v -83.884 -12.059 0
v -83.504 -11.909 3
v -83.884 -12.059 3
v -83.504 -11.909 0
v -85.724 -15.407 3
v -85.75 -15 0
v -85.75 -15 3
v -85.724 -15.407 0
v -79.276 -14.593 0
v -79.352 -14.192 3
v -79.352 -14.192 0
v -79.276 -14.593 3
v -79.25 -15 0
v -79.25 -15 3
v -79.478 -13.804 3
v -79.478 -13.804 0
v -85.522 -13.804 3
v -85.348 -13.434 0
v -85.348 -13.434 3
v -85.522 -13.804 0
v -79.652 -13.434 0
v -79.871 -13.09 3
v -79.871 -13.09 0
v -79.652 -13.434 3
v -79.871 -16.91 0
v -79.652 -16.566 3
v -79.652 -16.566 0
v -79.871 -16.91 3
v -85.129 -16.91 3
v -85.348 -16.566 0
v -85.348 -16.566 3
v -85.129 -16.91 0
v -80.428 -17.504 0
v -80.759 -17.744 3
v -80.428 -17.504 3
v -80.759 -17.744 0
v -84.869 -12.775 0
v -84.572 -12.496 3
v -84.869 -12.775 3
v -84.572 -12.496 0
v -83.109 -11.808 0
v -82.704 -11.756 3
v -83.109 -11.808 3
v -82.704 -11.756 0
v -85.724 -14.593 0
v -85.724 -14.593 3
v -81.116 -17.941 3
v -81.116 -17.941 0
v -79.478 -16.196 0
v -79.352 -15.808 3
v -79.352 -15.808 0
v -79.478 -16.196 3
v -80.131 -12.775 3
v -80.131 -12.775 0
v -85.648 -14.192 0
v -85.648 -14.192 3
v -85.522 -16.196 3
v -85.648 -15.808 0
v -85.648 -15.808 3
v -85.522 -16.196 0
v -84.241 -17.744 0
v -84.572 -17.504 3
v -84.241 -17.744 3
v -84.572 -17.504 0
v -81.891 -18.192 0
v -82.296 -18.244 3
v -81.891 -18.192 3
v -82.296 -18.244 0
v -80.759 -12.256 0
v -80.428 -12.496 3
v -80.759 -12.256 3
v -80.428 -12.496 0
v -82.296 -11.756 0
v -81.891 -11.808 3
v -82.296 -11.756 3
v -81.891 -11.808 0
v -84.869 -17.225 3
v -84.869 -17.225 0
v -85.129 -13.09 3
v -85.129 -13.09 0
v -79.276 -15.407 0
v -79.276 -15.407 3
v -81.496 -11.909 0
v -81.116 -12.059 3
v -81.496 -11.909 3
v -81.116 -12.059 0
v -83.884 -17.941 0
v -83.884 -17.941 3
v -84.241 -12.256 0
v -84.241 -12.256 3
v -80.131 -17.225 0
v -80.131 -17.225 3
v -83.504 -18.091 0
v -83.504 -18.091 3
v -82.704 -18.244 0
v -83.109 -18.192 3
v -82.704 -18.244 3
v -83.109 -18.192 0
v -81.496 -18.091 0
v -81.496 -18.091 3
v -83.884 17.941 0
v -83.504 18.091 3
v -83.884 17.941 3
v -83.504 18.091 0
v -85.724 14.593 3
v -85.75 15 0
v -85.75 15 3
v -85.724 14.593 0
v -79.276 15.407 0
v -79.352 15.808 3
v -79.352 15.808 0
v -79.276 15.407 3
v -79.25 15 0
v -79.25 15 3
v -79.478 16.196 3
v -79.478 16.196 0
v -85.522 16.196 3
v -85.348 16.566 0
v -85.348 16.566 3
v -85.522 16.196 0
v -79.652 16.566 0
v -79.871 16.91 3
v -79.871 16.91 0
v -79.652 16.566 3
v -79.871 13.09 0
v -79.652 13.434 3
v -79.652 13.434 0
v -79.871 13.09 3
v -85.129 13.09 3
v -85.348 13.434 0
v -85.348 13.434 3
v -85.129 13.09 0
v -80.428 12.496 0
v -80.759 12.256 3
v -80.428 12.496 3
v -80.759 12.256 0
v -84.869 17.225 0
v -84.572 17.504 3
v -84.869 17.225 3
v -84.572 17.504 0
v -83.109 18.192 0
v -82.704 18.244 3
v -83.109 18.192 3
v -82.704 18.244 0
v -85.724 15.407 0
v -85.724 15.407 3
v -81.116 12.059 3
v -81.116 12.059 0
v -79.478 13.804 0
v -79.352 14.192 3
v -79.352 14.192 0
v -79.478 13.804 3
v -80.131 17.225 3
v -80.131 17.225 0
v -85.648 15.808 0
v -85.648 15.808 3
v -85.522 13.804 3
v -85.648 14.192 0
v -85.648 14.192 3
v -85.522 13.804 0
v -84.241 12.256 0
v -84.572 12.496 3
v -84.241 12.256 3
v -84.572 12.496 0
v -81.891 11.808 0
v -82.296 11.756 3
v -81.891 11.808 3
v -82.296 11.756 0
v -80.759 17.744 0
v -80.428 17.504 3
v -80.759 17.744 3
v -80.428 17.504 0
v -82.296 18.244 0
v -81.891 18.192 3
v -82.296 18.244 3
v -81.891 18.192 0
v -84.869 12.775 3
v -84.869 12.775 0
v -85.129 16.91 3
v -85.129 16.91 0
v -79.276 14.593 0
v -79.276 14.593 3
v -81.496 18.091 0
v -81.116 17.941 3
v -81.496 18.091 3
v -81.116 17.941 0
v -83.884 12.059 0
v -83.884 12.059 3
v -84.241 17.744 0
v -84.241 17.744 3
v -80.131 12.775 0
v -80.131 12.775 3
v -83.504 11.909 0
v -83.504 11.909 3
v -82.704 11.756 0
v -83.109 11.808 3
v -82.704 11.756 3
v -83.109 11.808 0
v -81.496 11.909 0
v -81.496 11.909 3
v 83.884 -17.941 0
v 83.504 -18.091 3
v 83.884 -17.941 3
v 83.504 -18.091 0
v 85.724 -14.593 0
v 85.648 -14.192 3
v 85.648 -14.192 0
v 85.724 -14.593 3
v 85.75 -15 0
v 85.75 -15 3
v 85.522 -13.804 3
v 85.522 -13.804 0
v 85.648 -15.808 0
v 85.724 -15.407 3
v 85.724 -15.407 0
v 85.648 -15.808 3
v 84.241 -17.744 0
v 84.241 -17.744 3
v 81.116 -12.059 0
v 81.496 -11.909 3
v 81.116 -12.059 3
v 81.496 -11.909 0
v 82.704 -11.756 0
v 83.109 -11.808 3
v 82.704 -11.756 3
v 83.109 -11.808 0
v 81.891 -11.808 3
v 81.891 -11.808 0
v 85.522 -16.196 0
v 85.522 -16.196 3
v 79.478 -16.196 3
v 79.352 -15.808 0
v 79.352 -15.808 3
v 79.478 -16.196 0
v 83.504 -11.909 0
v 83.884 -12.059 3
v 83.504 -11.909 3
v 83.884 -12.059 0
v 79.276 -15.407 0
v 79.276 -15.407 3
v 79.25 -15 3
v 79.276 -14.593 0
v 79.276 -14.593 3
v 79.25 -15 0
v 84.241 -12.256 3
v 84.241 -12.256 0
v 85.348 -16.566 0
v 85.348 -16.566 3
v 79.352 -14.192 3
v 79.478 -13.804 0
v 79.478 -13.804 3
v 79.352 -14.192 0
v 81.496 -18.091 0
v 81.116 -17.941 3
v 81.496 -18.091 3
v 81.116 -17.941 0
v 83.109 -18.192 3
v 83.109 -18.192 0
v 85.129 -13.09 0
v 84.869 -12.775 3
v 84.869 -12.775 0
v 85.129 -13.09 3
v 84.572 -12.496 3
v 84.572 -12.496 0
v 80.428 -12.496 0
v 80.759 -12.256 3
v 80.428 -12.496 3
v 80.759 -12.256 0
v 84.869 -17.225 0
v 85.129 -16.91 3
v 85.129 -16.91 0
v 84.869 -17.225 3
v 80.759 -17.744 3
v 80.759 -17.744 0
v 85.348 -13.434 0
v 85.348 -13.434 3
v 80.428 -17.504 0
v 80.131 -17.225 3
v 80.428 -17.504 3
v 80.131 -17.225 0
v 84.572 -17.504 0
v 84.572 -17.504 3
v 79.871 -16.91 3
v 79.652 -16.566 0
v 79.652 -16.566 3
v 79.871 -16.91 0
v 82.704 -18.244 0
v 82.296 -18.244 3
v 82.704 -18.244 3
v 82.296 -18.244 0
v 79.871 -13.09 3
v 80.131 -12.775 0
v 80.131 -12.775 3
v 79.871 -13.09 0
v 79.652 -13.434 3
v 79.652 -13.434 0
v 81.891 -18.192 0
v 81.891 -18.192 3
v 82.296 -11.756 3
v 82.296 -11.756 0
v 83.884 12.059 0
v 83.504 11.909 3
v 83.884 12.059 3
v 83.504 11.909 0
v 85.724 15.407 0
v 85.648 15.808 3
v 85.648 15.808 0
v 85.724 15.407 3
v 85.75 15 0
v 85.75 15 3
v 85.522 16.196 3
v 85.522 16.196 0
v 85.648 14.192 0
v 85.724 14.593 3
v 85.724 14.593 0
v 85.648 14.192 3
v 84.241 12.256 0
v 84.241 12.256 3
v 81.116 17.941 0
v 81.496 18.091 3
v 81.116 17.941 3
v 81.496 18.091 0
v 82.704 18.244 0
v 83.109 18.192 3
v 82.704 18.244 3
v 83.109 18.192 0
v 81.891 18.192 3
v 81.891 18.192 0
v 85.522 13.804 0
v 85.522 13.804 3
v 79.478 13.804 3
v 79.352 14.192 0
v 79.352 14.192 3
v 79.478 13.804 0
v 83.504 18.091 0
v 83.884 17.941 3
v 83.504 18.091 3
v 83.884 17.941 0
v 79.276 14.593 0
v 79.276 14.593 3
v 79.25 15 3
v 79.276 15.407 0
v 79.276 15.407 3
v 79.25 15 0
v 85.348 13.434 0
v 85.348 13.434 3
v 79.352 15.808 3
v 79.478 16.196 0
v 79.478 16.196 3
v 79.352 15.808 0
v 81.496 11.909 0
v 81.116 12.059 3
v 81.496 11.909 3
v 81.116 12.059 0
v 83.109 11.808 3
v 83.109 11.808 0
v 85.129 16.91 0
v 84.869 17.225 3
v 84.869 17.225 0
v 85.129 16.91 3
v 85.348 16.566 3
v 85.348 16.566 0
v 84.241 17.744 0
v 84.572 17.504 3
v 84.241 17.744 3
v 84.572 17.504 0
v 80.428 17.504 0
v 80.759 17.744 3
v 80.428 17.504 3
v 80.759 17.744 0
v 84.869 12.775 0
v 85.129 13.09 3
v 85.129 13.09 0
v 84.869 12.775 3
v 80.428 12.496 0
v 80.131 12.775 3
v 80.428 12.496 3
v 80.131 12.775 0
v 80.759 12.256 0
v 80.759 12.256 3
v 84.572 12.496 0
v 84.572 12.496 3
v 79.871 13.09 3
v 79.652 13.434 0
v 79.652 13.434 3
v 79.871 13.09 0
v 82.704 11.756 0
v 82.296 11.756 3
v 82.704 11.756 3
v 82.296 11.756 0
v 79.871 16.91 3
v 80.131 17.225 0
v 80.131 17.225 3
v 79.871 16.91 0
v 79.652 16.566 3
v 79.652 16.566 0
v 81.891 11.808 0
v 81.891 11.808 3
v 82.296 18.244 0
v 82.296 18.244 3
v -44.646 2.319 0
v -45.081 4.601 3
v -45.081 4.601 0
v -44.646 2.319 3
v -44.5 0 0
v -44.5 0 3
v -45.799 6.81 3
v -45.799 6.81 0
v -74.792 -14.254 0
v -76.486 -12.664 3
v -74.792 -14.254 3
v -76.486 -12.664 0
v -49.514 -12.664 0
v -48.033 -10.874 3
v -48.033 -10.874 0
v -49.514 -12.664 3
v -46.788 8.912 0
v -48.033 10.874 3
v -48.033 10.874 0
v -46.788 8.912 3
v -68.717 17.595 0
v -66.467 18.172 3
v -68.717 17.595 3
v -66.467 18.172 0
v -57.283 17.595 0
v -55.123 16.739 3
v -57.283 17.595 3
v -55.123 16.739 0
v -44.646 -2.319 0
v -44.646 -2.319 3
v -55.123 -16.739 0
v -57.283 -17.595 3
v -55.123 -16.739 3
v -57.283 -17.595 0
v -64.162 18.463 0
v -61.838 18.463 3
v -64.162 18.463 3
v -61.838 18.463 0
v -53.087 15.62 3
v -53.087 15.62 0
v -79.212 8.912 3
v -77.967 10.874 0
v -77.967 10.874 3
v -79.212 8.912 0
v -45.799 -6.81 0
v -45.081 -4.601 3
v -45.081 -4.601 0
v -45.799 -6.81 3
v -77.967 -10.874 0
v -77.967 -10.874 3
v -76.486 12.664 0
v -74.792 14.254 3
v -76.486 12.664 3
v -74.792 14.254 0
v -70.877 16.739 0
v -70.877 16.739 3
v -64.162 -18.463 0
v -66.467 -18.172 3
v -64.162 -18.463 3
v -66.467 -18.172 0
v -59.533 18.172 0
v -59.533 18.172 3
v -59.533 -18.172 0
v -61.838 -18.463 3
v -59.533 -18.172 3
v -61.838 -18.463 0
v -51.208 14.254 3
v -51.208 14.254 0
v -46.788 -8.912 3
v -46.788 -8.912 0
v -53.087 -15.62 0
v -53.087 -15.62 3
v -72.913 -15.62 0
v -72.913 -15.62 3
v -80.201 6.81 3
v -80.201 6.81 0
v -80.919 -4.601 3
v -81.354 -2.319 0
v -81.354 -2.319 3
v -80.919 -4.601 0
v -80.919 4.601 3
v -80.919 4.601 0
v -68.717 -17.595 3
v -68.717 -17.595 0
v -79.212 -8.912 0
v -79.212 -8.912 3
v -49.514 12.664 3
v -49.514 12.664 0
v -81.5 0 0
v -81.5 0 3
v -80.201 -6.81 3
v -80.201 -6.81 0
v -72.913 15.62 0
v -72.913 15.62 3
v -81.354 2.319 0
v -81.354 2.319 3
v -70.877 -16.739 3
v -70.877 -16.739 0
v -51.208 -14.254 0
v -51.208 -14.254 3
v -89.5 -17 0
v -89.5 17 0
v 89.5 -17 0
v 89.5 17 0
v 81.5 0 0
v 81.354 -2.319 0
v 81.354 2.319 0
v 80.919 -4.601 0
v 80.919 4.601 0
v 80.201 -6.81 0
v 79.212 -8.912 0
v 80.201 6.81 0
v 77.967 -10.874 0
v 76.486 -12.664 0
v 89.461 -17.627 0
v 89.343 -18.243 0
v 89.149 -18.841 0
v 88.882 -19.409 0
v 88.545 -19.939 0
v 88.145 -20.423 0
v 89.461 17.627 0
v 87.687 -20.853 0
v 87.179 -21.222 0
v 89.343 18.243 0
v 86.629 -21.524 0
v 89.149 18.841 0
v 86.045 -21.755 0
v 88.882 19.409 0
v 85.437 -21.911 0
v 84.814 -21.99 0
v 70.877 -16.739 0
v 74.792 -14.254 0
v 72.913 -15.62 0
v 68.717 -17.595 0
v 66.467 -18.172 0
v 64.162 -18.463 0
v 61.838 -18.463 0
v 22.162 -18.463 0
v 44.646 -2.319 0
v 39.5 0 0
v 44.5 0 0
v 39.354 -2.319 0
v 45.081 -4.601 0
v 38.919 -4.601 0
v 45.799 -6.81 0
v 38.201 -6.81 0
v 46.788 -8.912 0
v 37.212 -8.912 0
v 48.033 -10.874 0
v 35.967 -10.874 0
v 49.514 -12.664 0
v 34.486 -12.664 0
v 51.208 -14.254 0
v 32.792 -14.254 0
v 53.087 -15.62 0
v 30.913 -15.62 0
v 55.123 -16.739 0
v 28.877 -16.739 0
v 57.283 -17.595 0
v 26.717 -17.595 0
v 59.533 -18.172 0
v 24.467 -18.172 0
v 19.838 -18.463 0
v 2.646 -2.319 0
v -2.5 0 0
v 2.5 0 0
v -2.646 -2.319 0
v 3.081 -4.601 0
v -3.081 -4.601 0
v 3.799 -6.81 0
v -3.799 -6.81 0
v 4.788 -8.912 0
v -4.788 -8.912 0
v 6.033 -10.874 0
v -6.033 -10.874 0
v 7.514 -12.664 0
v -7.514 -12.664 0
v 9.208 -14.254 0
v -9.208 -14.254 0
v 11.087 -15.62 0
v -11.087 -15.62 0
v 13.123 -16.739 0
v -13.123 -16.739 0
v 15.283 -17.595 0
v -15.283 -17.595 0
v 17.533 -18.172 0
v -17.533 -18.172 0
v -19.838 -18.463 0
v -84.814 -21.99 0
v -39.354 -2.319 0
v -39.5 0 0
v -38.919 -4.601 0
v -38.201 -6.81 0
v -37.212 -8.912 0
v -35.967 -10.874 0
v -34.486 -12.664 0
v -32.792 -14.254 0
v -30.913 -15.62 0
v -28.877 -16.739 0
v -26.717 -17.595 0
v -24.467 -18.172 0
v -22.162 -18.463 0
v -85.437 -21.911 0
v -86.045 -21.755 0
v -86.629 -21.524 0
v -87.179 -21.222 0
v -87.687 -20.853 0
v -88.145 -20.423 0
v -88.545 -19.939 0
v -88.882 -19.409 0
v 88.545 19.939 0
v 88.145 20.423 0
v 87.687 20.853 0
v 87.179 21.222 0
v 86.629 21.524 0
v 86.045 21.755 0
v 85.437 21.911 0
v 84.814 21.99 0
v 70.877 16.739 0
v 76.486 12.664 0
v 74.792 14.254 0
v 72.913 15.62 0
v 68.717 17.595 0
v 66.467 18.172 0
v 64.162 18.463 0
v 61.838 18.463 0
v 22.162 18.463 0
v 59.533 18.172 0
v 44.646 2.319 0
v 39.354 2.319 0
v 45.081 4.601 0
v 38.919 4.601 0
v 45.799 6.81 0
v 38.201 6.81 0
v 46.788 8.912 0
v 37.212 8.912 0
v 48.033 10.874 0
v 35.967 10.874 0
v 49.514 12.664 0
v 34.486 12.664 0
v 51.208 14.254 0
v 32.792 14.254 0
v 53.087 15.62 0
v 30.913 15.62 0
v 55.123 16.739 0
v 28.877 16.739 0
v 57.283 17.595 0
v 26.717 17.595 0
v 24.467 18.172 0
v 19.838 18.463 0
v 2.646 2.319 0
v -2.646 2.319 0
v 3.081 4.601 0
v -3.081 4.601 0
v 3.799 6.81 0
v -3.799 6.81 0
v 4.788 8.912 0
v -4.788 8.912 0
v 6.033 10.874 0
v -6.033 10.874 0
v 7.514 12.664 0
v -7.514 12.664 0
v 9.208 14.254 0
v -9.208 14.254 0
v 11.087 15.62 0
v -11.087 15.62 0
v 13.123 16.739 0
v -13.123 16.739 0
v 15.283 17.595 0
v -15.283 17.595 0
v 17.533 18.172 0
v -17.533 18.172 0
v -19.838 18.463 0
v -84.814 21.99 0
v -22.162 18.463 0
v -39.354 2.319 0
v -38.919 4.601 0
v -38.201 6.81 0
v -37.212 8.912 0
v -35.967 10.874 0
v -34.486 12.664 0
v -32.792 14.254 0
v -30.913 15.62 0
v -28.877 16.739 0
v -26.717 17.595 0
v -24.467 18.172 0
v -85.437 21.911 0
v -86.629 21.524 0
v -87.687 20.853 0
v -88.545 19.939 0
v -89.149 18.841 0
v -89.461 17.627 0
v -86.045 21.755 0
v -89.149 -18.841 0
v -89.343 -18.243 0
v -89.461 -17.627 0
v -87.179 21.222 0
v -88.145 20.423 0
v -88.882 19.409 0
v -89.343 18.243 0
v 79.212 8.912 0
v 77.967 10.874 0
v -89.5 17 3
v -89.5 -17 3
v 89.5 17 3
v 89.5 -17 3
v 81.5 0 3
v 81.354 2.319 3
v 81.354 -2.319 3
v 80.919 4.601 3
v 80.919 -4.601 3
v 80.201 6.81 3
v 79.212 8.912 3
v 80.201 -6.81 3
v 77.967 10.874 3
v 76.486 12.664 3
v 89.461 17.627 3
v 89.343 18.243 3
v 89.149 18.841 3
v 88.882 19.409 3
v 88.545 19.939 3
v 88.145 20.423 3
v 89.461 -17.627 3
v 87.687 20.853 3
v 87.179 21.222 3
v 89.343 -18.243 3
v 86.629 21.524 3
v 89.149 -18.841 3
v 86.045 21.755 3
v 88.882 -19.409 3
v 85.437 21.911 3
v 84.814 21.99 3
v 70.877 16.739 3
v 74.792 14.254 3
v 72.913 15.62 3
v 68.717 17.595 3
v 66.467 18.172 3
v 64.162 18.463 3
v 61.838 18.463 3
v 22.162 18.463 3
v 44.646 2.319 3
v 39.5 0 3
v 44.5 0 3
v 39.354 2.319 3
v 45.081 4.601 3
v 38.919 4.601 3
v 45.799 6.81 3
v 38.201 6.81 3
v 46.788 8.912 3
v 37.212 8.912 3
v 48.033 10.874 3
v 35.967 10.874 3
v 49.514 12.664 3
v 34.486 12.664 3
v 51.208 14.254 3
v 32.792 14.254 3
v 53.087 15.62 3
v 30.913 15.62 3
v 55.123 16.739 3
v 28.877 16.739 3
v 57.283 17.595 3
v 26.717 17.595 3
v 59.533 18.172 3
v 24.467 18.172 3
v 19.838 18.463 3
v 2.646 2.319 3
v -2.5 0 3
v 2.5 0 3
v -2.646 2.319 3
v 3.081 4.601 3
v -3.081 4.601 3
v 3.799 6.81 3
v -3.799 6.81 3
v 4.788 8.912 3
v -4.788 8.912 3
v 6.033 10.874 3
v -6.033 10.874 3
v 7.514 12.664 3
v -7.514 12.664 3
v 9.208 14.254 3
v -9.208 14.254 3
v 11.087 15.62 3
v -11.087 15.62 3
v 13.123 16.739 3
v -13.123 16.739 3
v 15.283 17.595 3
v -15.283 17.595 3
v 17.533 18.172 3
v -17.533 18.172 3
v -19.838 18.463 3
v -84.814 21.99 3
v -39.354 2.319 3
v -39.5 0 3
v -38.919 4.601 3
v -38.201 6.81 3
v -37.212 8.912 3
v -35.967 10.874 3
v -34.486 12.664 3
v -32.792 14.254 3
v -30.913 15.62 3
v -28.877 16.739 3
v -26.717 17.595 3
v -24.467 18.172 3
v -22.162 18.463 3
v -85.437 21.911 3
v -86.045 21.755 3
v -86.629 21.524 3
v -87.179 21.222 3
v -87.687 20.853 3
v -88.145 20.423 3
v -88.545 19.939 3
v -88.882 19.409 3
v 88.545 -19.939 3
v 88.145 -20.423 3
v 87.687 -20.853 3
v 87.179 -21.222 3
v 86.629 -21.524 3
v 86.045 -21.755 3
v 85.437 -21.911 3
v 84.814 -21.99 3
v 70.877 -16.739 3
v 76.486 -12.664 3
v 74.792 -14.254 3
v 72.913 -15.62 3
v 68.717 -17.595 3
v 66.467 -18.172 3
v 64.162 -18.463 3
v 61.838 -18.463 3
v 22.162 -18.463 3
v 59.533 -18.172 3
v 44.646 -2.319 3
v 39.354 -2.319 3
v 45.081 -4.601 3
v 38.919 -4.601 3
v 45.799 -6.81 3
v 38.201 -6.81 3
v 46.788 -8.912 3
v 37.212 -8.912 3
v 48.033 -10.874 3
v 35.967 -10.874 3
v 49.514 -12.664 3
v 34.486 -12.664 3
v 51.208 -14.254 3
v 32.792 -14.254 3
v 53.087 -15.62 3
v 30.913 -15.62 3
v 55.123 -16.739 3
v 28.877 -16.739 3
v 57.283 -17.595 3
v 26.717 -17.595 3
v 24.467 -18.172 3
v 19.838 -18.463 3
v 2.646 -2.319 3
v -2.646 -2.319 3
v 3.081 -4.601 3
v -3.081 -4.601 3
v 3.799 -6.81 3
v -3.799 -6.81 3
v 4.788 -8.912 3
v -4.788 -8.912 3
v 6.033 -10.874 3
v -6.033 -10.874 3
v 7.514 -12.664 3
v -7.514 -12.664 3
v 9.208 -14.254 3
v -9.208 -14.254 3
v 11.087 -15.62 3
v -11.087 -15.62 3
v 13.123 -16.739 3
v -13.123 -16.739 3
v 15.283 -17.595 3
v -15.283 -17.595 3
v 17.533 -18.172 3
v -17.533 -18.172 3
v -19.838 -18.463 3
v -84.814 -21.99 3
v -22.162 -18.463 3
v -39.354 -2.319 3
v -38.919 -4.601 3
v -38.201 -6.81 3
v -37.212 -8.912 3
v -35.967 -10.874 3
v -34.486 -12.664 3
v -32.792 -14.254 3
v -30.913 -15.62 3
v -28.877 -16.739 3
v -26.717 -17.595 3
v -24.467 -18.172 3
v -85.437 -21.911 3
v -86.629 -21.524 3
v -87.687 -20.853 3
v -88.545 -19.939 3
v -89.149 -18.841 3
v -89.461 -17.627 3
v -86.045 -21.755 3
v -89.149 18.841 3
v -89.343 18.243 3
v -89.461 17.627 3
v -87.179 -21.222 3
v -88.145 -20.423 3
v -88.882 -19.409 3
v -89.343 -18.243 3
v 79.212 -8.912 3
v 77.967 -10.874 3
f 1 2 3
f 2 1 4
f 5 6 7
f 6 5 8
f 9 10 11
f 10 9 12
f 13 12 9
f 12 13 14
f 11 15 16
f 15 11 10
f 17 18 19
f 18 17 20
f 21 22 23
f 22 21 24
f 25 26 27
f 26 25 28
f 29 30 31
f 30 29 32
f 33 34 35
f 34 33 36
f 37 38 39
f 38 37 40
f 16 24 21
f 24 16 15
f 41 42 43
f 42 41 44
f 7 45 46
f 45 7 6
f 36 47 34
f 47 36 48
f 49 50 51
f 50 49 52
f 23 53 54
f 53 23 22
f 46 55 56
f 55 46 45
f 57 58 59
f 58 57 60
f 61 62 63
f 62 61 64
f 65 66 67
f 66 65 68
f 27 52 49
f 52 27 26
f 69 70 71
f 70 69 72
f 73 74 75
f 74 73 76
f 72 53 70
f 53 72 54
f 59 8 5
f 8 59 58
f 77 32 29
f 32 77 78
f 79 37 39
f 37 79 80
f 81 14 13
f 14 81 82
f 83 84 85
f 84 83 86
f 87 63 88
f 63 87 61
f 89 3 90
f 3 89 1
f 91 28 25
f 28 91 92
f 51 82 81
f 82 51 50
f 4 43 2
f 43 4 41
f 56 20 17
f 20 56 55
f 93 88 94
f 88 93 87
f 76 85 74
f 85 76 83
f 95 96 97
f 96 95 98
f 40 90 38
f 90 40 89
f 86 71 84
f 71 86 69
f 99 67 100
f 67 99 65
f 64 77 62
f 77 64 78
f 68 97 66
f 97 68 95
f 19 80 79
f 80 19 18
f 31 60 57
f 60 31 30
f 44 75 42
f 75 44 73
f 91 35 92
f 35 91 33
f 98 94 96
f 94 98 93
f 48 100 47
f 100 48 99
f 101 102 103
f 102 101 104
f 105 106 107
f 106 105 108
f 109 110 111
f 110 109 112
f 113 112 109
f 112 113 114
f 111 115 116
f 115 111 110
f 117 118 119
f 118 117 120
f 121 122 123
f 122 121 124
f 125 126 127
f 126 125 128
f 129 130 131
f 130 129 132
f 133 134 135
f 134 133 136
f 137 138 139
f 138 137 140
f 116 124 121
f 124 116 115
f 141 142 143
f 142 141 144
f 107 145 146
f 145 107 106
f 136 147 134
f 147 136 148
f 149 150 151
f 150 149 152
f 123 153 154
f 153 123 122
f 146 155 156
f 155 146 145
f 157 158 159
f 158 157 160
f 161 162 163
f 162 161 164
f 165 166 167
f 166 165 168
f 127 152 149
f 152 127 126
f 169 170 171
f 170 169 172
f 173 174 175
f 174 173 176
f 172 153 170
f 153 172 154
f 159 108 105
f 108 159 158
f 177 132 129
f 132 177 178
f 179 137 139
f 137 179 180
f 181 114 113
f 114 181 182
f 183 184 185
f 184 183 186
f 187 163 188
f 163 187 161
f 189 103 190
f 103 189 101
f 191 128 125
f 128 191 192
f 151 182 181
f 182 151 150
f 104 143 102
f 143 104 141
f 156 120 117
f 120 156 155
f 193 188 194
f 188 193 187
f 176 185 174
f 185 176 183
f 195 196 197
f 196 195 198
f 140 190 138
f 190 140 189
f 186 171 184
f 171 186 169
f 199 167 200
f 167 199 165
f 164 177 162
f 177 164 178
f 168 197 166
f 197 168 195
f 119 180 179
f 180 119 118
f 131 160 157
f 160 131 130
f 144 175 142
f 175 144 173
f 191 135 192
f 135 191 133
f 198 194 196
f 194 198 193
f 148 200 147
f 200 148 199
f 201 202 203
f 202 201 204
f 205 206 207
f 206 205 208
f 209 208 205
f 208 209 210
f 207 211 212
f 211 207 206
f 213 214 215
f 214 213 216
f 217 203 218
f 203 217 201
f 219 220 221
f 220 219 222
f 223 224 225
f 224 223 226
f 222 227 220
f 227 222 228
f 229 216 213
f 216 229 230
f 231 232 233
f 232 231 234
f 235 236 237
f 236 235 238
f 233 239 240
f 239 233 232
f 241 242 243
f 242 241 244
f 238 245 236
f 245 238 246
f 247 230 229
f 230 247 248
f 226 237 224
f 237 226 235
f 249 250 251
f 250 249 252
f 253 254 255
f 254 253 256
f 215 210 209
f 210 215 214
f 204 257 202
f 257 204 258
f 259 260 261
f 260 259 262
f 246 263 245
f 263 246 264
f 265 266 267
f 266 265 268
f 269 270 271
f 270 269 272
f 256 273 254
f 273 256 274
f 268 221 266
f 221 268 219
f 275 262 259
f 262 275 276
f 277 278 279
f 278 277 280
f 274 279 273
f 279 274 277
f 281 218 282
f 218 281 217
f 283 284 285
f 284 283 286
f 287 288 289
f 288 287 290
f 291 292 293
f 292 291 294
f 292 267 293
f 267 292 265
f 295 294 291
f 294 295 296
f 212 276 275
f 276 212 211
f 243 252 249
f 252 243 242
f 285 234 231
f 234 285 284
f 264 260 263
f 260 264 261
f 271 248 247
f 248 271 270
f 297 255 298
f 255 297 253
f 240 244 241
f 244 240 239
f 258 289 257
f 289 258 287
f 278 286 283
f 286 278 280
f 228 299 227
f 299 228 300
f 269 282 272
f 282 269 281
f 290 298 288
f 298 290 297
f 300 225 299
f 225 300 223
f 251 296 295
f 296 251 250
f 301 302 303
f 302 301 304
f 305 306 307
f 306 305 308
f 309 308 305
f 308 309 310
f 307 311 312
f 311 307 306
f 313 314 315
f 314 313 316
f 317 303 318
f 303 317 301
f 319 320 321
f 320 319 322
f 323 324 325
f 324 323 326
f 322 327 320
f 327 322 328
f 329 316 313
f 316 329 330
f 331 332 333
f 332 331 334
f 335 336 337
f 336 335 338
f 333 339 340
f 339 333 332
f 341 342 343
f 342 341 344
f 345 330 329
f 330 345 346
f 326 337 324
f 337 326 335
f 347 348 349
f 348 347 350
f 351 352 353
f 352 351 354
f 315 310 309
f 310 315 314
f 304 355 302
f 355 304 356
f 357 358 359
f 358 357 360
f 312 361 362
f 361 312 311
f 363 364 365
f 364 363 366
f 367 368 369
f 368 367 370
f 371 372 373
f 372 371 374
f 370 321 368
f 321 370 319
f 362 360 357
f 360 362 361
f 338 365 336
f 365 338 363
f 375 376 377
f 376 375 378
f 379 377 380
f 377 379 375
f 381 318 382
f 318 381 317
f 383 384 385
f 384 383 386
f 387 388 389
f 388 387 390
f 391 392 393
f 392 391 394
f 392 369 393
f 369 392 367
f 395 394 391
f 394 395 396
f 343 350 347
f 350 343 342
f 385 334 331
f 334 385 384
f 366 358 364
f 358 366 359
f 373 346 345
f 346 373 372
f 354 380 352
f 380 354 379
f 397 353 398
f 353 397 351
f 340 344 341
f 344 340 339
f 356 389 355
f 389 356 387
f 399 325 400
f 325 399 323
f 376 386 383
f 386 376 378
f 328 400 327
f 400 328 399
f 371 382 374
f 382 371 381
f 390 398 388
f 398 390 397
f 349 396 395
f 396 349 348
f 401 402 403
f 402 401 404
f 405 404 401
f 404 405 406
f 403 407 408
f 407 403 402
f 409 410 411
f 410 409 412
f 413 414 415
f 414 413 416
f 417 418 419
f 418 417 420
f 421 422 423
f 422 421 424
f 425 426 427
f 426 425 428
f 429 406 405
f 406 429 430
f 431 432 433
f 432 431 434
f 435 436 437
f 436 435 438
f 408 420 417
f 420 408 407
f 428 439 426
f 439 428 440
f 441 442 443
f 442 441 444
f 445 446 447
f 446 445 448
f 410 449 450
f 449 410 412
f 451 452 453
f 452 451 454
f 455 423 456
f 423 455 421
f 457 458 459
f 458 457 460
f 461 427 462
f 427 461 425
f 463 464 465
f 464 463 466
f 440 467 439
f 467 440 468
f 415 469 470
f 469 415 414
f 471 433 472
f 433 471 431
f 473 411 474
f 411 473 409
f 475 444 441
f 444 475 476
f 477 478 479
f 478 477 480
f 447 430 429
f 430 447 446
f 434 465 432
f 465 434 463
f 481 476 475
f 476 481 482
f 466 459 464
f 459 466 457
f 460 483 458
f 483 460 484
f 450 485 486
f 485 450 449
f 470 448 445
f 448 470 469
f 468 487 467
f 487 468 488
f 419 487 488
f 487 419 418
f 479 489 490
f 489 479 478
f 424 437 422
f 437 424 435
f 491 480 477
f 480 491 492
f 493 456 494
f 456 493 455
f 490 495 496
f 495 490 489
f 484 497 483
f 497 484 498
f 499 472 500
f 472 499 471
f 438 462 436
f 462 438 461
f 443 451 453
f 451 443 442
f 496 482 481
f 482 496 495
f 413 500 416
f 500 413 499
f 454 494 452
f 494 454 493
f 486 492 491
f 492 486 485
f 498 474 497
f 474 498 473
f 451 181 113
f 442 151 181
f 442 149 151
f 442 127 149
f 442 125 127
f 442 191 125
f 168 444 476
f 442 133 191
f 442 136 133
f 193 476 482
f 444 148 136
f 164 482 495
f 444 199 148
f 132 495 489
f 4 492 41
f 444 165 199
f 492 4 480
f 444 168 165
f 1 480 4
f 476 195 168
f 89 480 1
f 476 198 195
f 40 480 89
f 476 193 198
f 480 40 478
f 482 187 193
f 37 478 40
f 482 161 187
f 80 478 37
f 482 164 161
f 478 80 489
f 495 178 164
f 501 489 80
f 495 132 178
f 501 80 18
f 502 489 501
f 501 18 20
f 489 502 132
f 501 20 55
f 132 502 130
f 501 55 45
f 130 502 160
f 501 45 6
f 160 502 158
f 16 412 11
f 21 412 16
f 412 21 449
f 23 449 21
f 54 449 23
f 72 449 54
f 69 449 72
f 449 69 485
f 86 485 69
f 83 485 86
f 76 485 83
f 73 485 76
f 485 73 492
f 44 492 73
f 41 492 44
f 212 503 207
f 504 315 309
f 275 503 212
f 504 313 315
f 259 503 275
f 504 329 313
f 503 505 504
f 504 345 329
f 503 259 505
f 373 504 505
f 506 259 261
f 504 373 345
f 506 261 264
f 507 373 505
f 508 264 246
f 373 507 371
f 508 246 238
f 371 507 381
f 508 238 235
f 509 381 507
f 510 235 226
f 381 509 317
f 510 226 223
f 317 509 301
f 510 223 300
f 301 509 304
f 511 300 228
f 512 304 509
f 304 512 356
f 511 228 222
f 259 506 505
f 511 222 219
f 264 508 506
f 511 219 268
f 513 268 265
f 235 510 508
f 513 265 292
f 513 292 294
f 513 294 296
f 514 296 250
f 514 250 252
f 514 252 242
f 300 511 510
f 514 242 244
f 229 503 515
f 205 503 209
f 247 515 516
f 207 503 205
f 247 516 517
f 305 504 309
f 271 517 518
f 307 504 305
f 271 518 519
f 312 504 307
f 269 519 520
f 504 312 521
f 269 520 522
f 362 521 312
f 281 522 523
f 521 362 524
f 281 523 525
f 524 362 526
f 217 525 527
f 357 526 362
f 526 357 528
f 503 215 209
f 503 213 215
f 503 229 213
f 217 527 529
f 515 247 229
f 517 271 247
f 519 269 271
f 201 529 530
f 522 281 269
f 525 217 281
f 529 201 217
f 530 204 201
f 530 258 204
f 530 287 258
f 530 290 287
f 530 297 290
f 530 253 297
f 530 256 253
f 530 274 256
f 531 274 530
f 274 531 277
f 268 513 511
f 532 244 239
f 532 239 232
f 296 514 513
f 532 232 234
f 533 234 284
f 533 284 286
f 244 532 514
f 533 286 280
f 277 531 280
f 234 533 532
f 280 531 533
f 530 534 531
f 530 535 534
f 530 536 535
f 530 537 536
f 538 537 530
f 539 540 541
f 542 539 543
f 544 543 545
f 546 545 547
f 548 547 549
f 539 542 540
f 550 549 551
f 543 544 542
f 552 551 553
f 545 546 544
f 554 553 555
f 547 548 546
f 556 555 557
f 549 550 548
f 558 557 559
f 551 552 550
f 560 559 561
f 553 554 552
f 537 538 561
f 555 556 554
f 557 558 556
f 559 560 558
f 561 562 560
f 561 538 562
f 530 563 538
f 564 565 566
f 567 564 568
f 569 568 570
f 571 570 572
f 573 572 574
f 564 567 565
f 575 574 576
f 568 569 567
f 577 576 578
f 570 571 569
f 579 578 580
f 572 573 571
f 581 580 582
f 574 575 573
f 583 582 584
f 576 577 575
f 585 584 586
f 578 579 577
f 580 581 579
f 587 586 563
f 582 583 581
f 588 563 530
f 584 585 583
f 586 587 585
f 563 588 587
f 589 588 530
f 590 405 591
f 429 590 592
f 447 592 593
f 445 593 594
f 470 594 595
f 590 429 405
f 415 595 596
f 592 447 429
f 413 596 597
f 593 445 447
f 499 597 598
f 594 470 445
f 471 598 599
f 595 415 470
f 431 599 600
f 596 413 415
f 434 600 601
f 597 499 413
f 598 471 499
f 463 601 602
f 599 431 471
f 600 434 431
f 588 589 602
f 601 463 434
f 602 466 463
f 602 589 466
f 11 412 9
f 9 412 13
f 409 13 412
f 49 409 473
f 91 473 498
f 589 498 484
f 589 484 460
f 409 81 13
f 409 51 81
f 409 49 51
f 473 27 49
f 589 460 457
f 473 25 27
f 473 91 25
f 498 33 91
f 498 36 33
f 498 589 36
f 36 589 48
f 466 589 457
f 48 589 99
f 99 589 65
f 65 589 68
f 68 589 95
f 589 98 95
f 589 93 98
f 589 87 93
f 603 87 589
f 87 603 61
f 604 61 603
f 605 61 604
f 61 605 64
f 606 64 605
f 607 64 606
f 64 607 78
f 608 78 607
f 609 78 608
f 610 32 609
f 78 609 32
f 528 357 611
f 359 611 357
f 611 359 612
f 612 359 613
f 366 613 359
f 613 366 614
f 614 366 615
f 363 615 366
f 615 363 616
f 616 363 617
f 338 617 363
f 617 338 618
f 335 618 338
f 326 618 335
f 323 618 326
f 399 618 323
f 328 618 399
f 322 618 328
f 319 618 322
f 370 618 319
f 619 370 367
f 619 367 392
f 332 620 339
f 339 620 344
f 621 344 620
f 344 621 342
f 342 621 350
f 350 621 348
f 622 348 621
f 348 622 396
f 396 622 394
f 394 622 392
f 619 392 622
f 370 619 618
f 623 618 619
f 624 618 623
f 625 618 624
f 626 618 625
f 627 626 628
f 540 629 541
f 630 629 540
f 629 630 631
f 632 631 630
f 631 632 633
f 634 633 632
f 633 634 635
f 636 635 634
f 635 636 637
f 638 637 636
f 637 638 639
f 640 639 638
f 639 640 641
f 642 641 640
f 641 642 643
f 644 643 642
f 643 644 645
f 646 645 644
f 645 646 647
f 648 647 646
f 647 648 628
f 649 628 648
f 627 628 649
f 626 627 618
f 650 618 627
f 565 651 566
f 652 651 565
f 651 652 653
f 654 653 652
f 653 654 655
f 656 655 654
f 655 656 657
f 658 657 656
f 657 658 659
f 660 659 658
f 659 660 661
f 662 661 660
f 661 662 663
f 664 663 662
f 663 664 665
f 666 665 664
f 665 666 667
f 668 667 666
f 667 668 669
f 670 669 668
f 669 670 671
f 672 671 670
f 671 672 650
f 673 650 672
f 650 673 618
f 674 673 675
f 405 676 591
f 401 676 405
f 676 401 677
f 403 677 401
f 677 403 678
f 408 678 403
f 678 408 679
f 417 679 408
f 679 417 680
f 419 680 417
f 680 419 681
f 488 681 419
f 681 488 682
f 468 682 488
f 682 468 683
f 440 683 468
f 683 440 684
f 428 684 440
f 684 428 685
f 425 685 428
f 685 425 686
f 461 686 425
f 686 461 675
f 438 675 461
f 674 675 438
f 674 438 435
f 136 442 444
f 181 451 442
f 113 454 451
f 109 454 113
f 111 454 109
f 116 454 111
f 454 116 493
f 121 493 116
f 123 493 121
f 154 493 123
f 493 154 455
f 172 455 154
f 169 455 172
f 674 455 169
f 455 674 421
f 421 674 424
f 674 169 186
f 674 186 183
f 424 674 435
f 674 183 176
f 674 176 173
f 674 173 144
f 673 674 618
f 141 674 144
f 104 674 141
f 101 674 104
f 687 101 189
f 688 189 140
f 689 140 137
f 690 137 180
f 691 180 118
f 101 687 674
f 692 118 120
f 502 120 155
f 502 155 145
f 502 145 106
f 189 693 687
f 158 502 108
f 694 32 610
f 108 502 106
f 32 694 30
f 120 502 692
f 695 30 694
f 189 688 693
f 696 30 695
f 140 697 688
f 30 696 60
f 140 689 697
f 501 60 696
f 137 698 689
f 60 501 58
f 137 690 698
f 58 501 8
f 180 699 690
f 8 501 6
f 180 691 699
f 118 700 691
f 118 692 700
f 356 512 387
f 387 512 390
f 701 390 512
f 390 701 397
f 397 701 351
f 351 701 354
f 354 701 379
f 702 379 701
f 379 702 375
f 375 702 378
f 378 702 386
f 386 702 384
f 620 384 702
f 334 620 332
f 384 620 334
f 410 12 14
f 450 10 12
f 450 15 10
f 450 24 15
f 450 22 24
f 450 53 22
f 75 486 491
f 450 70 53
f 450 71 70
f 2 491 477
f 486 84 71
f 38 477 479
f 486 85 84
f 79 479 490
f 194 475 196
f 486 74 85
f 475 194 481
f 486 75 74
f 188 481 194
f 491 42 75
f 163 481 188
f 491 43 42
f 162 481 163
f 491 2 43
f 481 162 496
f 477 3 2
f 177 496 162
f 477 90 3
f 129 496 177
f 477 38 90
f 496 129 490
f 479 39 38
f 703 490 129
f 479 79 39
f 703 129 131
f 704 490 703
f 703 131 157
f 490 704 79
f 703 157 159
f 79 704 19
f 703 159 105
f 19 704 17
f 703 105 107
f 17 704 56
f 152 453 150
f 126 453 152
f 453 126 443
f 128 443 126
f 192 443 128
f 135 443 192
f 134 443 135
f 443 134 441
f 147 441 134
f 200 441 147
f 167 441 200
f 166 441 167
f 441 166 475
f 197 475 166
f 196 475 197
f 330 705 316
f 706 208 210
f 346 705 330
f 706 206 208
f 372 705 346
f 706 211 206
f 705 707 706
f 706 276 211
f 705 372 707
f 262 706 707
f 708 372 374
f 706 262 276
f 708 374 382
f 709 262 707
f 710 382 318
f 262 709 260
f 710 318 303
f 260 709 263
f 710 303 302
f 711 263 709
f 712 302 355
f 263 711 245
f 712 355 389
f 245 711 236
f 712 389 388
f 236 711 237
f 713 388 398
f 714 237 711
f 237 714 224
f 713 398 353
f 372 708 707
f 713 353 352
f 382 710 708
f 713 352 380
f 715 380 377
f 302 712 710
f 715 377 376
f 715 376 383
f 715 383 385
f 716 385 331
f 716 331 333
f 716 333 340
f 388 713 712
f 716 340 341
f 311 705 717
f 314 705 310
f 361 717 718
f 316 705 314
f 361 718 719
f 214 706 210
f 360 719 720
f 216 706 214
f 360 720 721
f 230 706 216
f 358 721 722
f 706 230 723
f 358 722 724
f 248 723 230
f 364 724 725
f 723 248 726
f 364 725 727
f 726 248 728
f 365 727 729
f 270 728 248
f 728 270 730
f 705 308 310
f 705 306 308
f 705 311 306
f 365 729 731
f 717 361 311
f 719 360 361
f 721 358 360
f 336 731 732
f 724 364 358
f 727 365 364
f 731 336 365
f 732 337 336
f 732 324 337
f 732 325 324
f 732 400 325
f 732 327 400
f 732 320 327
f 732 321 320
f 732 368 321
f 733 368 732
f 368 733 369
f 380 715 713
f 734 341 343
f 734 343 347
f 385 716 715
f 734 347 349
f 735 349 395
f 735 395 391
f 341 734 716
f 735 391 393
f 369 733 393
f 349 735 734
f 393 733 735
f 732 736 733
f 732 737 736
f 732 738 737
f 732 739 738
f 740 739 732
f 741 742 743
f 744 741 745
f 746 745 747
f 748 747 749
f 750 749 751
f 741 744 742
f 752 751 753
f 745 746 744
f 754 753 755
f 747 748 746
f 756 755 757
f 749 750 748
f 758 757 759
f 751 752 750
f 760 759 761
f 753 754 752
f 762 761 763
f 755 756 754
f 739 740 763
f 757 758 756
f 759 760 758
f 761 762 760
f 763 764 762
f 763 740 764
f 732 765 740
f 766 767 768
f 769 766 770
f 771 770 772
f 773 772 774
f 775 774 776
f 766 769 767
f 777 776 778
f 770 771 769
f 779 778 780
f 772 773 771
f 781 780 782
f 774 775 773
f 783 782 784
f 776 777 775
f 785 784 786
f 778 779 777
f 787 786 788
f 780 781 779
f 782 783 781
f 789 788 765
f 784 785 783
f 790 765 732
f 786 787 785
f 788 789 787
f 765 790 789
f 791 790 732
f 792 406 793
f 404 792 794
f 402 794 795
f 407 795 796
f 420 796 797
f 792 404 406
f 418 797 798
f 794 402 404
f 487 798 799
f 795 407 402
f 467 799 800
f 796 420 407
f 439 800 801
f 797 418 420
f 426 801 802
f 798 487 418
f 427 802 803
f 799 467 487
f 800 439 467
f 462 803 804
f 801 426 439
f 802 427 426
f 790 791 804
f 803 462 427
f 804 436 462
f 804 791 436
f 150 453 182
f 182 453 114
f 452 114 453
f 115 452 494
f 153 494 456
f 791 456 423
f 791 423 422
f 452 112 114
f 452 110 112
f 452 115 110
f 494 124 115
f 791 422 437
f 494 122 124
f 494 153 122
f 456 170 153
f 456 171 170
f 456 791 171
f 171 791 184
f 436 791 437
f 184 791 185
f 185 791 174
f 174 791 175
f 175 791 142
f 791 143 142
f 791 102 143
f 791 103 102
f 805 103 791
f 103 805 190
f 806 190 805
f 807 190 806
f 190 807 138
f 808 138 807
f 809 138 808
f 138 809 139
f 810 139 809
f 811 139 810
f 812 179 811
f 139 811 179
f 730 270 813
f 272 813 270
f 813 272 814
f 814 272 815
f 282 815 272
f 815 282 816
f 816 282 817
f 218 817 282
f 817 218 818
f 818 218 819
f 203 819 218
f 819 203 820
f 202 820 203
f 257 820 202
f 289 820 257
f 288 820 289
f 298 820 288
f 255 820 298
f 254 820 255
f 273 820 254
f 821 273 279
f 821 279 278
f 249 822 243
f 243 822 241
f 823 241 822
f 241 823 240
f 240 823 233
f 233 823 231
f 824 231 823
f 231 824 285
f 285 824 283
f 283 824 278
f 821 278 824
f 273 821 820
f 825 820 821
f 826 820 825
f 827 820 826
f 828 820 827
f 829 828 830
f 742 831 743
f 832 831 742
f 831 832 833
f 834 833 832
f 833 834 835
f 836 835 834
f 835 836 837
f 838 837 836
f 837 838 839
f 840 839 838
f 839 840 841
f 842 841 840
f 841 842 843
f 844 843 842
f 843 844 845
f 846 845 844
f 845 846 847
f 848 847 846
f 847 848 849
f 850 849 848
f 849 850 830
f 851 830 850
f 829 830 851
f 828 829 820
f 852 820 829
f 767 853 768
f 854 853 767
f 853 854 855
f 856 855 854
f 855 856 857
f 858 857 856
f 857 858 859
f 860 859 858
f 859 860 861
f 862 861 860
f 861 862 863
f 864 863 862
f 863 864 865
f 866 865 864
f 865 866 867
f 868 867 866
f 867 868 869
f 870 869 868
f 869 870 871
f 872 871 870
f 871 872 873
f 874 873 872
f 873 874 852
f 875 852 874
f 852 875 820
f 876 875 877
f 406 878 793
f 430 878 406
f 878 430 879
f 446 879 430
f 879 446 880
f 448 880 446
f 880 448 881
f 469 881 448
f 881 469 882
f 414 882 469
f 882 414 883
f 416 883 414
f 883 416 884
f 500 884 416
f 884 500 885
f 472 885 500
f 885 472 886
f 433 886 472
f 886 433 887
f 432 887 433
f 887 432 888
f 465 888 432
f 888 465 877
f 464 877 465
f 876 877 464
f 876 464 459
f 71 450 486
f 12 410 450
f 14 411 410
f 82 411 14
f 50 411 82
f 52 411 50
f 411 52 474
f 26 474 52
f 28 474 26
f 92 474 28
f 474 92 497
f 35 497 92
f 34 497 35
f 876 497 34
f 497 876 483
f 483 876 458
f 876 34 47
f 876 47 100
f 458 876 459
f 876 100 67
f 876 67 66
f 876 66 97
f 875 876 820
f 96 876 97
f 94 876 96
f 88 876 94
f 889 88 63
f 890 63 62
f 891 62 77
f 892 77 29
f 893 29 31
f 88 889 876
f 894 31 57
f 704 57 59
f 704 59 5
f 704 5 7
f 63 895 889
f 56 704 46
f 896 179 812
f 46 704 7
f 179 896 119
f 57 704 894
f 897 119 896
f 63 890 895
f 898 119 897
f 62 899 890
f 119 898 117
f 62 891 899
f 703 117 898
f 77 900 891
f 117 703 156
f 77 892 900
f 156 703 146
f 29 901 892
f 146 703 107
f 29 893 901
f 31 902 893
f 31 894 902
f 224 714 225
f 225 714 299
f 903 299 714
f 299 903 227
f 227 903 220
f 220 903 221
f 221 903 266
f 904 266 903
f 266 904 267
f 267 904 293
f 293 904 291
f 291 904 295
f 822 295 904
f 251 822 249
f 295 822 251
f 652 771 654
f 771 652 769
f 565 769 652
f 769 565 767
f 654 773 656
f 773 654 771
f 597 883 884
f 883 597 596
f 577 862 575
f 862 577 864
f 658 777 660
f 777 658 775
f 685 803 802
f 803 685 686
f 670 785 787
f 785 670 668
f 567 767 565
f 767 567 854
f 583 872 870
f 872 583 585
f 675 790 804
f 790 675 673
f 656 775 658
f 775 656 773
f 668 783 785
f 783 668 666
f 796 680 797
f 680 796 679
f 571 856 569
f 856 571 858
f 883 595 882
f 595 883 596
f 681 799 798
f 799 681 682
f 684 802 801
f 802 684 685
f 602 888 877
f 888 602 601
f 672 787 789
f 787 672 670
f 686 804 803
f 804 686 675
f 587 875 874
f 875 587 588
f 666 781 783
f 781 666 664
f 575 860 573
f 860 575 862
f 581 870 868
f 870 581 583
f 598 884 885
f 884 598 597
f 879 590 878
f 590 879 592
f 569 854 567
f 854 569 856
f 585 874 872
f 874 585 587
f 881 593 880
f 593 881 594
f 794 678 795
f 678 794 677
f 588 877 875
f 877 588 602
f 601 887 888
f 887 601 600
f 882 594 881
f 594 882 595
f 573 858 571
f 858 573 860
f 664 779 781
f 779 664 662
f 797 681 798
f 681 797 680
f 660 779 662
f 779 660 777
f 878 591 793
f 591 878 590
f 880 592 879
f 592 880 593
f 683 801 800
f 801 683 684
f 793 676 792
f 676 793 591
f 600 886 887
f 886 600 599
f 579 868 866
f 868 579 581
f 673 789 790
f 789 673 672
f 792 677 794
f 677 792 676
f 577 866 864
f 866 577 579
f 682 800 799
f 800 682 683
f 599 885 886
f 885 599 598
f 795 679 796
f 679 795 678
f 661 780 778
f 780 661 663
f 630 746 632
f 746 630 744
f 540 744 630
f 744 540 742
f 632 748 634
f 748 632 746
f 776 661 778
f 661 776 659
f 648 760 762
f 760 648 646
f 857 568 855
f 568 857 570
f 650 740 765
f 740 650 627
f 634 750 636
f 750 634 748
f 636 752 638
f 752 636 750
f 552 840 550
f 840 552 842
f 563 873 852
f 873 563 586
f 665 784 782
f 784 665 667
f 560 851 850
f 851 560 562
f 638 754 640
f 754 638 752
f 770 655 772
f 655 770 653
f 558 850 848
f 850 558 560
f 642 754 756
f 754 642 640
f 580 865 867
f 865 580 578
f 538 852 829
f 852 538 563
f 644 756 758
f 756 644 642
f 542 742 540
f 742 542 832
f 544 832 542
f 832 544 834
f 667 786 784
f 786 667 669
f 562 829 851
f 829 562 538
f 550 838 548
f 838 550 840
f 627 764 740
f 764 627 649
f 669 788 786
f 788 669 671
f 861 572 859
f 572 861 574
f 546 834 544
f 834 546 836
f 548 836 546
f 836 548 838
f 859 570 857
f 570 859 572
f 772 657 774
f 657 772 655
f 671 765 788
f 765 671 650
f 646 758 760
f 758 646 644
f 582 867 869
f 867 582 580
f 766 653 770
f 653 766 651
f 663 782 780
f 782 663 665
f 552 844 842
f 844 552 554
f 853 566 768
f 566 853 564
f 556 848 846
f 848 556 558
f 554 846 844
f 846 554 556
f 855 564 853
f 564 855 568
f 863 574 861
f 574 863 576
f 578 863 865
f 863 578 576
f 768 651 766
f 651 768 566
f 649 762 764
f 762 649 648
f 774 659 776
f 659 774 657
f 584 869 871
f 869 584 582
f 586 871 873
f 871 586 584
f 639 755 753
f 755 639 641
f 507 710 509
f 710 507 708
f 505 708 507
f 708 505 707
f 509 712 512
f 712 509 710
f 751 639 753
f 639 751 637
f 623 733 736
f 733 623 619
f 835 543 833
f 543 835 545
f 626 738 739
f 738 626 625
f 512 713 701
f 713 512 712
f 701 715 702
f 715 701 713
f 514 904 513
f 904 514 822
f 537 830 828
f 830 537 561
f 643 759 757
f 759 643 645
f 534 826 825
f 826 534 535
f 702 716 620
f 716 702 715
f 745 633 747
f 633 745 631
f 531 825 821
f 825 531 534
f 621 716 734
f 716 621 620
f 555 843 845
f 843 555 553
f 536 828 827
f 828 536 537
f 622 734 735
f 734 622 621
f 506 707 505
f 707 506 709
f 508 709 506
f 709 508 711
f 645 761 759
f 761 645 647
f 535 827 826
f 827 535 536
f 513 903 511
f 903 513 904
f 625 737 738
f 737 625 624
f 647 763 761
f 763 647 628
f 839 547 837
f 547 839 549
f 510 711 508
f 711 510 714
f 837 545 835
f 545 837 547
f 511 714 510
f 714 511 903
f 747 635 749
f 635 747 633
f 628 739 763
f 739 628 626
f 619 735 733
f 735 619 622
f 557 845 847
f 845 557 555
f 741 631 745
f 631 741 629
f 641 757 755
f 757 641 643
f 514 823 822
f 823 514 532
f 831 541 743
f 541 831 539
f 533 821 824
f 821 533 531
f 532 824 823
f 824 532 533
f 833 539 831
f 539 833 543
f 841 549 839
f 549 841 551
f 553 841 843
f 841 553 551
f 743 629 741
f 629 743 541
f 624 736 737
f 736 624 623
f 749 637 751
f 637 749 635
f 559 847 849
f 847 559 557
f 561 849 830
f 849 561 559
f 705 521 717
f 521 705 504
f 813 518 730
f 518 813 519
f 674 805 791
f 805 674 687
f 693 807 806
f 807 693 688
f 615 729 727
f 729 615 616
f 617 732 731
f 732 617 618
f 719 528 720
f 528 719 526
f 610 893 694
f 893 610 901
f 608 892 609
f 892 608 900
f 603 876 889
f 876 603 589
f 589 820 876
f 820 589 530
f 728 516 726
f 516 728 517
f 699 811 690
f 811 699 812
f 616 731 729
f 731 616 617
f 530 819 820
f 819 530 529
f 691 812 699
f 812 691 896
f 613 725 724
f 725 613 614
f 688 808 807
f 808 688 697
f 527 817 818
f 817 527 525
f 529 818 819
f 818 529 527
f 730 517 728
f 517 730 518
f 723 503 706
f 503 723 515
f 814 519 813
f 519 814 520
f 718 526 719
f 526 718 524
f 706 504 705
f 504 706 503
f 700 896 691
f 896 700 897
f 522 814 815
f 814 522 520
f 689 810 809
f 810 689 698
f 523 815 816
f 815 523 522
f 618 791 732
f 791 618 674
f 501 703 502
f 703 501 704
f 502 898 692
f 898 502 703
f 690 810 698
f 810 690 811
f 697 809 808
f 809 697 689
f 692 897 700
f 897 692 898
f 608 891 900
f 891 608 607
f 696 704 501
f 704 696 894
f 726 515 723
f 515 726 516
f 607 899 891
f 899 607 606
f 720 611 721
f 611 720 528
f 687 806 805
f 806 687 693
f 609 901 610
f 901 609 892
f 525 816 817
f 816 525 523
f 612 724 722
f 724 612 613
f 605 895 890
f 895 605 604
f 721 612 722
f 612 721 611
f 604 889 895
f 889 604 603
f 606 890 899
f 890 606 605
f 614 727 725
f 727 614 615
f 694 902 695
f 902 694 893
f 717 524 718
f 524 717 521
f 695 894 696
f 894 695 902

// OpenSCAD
$fn = 50;


difference() {
	union() {
		hull() {
			translate(v = [-84.5000000000, 17.0000000000, 0]) {
				cylinder(h = 3, r = 5);
			}
			translate(v = [84.5000000000, 17.0000000000, 0]) {
				cylinder(h = 3, r = 5);
			}
			translate(v = [-84.5000000000, -17.0000000000, 0]) {
				cylinder(h = 3, r = 5);
			}
			translate(v = [84.5000000000, -17.0000000000, 0]) {
				cylinder(h = 3, r = 5);
			}
		}
	}
	union() {
		#translate(v = [-82.5000000000, -15.0000000000, -100.0000000000]) {
			cylinder(h = 200, r = 3.2500000000);
		}
		#translate(v = [-82.5000000000, 15.0000000000, -100.0000000000]) {
			cylinder(h = 200, r = 3.2500000000);
		}
		#translate(v = [82.5000000000, -15.0000000000, -100.0000000000]) {
			cylinder(h = 200, r = 3.2500000000);
		}
		#translate(v = [82.5000000000, 15.0000000000, -100.0000000000]) {
			cylinder(h = 200, r = 3.2500000000);
		}
		#translate(v = [-63.0000000000, 0, 0]) {
			cylinder(h = 3, r = 18.5000000000);
		}
		#translate(v = [-21.0000000000, 0, 0]) {
			cylinder(h = 3, r = 18.5000000000);
		}
		#translate(v = [21.0000000000, 0, 0]) {
			cylinder(h = 3, r = 18.5000000000);
		}
		#translate(v = [63.0000000000, 0, 0]) {
			cylinder(h = 3, r = 18.5000000000);
		}
	}
}
